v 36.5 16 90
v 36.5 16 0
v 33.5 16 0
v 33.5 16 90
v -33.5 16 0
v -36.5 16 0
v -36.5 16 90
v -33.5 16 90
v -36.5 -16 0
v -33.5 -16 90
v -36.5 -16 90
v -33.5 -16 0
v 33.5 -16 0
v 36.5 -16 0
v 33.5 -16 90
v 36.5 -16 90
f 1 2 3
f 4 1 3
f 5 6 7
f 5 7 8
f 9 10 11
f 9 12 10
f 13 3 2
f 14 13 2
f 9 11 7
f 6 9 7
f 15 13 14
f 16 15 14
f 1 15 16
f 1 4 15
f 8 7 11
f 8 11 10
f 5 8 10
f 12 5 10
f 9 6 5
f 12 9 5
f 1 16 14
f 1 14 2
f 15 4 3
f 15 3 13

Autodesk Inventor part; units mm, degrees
ref_plane "YZ Plane" through (0, 0, 0) normal (1, 0, 0) x (0, 1, 0)
ref_plane "XZ Plane" through (0, 0, 0) normal (0, 1, 0) x (-1, 0, 0)
ref_plane "XY Plane" through (0, 0, 0) normal (0, 0, 1) x (1, 0, 0)
sketch "Sketch1" plane through (0, 0, 0) normal (0, 0, 1) x (1, 0, 0)
  line L0 (-36.5, 16) -> (36.5, 16) construction
  line L1 (-36.5, 16) -> (-33.5, 16)
  line L2 (-33.5, 16) -> (-33.5, -16)
  line L3 (-33.5, -16) -> (-36.5, -16)
  line L4 (-36.5, -16) -> (-36.5, 16)
  line L5 (0, 16) -> (0, -16) construction
  line L6 (36.5, 16) -> (33.5, 16)
  line L7 (33.5, 16) -> (33.5, -16)
  line L8 (33.5, -16) -> (36.5, -16)
  line L9 (36.5, -16) -> (36.5, 16)
  point P0 (0, 0)
  dimension "d0" = 73
  dimension "d1" = 3
  dimension "d2" = 32
  dimension "d3" = 16
extrude "Extrusion1" add sketch "Sketch1" along normal blind 90
equation "\"d0\" = Esla_Bas_Largo"
equation "\"d1\" = Esla_Bas_Espesor"
equation "\"d2\" = Esla_Bas_Ancho"
equation "\"Esla_Bas_Largo\" = 73"
equation "\"Esla_Bas_Espesor\" = 3"
equation "\"Esla_Bas_Ancho\" = 32"
properties part number "Eslabón2_Largo" material "Stainless Steel"
